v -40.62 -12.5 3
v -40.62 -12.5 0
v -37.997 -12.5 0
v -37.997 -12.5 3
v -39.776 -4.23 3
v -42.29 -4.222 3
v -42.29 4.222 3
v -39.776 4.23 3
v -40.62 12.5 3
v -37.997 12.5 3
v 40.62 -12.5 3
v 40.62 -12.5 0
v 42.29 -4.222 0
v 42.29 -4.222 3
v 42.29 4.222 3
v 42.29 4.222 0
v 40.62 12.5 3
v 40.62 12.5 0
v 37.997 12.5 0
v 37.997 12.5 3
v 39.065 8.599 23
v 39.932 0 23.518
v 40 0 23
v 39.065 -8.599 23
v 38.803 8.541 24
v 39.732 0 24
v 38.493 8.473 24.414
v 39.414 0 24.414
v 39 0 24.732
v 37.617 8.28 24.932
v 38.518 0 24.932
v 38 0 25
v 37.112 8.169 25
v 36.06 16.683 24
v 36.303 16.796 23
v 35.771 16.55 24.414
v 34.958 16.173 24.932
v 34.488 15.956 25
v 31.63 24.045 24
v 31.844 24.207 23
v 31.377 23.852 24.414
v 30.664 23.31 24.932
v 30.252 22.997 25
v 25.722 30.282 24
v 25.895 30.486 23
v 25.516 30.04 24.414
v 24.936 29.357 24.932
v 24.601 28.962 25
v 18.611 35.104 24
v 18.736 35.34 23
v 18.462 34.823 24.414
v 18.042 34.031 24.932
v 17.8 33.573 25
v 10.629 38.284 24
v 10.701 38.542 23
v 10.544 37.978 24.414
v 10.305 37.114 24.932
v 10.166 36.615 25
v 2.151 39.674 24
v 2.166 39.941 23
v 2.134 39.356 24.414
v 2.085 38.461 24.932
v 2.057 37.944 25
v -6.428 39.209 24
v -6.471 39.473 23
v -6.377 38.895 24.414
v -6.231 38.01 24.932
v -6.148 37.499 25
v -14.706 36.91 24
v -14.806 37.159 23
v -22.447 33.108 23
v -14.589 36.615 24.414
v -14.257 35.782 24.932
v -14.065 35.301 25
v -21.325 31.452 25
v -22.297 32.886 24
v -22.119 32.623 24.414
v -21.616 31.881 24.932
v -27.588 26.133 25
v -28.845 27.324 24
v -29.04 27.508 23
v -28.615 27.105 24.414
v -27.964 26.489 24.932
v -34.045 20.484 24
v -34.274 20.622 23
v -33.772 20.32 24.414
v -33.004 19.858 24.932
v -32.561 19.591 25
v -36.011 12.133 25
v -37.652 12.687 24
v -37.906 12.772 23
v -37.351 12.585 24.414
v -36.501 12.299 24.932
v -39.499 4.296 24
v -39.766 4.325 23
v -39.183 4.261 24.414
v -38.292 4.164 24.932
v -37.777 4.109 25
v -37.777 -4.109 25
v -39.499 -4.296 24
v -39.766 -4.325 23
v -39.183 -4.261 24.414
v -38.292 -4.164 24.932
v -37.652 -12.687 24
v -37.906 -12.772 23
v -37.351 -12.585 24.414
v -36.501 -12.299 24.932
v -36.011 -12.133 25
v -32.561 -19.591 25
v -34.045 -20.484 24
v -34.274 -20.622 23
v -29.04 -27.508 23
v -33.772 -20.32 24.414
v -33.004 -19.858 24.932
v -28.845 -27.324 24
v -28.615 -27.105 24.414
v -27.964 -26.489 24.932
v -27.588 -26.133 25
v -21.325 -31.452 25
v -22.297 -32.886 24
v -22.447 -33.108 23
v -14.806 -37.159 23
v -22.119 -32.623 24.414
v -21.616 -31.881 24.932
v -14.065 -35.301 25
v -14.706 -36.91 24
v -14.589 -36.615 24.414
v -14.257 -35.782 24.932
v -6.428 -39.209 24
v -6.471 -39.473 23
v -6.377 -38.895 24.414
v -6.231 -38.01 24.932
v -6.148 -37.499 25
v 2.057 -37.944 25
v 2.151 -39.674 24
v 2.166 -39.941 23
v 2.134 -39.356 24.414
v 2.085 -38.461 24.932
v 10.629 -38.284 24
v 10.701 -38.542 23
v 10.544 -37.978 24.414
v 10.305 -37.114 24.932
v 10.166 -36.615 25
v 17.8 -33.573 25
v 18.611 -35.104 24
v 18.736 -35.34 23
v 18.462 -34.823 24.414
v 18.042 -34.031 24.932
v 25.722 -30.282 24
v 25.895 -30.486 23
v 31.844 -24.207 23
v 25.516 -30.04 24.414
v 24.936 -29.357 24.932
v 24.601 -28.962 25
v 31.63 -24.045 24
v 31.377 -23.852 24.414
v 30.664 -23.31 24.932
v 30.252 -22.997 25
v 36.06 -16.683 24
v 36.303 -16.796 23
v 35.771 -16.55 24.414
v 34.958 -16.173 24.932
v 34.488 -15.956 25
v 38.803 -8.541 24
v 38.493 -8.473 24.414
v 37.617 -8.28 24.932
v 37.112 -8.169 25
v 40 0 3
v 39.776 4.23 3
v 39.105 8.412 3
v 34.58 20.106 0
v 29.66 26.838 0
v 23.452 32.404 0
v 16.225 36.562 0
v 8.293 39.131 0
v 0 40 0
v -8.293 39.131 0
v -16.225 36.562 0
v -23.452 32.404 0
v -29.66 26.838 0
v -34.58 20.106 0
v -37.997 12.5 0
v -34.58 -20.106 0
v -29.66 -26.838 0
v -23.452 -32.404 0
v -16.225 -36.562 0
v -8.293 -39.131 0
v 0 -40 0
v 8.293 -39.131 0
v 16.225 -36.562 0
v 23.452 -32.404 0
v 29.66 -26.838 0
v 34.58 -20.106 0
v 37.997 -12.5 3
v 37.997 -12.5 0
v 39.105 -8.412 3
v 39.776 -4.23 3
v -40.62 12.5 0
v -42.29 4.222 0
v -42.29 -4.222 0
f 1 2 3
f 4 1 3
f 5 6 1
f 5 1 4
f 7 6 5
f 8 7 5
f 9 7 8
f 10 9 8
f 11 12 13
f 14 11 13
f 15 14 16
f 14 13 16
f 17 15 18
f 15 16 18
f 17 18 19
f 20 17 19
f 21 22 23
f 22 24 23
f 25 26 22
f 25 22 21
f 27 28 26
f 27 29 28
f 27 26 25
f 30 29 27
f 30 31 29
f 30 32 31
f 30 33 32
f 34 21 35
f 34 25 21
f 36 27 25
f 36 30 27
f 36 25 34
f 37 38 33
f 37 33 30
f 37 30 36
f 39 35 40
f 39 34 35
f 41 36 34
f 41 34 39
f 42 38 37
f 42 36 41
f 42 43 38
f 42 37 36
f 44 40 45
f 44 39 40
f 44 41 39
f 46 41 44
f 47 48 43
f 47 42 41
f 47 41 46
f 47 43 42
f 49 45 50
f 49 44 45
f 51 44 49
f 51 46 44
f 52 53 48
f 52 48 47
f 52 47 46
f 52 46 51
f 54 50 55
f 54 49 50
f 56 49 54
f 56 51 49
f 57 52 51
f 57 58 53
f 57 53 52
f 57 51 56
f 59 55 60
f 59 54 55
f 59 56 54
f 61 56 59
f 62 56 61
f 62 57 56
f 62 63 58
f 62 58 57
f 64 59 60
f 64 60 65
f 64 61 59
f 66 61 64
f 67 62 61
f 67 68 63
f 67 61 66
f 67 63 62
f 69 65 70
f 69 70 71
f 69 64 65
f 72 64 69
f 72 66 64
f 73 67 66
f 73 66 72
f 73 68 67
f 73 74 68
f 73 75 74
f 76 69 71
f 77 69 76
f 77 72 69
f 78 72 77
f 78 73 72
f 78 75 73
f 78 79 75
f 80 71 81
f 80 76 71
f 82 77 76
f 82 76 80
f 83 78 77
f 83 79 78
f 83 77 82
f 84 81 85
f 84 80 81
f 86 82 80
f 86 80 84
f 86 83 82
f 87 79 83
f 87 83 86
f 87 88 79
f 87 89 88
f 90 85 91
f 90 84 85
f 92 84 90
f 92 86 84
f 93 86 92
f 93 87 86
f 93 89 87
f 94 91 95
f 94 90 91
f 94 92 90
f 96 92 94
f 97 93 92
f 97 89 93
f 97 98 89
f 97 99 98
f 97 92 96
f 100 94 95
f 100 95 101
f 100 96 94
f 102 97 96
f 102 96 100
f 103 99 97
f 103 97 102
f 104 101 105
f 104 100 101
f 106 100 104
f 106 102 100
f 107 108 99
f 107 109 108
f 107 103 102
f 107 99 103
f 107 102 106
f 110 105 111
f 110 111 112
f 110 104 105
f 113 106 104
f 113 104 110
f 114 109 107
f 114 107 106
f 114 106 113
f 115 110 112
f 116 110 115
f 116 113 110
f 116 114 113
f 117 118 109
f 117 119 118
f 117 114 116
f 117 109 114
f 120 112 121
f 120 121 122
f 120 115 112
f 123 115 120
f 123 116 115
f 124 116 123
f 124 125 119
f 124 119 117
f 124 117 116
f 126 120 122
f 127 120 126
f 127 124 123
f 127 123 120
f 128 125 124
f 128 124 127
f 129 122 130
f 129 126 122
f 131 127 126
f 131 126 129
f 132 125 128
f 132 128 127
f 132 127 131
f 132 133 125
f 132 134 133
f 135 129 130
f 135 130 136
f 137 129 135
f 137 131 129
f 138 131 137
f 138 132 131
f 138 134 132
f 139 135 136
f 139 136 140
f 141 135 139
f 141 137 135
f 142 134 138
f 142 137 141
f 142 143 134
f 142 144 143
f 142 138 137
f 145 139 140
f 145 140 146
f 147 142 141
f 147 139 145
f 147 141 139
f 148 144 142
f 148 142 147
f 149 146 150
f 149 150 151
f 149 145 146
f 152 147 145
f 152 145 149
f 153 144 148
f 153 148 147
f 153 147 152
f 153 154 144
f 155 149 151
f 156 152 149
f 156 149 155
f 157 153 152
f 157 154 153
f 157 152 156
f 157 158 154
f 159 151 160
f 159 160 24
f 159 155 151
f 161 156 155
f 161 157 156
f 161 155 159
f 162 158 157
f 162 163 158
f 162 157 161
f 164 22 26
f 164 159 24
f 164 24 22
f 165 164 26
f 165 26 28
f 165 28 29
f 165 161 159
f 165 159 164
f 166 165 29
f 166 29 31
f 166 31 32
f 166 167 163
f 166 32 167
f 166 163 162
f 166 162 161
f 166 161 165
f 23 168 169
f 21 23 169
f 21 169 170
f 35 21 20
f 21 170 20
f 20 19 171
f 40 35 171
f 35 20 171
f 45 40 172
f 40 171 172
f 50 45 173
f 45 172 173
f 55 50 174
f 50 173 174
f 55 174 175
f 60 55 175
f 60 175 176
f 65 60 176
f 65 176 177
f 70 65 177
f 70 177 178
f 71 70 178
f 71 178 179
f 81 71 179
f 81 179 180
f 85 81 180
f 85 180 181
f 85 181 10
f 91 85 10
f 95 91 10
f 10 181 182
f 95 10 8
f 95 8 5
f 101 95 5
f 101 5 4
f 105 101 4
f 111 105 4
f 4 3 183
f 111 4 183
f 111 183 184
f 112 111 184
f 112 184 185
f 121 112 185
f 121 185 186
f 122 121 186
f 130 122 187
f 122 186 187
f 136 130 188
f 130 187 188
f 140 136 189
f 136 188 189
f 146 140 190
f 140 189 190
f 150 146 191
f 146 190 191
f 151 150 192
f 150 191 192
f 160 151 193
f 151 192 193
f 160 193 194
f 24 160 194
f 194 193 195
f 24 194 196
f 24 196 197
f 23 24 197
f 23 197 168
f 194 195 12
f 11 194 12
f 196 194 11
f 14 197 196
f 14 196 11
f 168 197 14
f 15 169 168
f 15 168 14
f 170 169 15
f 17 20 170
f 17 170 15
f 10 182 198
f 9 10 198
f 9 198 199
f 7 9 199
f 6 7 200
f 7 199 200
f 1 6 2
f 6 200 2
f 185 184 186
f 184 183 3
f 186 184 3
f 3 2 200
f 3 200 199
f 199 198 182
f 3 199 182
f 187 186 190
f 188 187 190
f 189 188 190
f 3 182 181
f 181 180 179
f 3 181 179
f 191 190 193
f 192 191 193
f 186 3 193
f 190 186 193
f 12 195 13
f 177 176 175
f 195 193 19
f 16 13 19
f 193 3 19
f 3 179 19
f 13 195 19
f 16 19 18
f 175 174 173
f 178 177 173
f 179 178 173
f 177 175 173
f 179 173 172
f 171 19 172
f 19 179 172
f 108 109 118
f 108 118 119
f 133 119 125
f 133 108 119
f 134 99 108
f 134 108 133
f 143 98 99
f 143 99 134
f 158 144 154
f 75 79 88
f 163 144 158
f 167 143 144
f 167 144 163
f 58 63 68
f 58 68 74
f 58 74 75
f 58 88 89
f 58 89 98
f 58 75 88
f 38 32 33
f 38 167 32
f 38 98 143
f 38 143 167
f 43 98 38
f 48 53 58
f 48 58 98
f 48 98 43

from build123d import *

# Parameters (mm, degrees)
F1_R     = 40
F2_DEPTH = 25
F4_DEPTH = 3
F5_R     = 2


with BuildPart() as f2:
    # F1 (on face) → F2 (new body)
    with BuildSketch(Plane.XY):
        Circle(F1_R)
    extrude(amount=F2_DEPTH)

    # F3 (on face) → F4 (join)
    with BuildSketch(Plane.XY):
        with BuildLine():
            Line((-40.620192, -12.5), (40.620192, -12.5))
            ThreePointArc((40.620192, -12.5), (42.5, 0), (40.620192, 12.5))
            Line((40.620192, 12.5), (-40.620192, 12.5))
            ThreePointArc((-40.620192, 12.5), (-42.5, 0), (-40.620192, -12.5))
        make_face()
    extrude(amount=F4_DEPTH)

    # F5
    f5_edges = [f2.edges().sort_by_distance(p)[0] for p in [
        (-40, 0, 25),
    ]]
    fillet(f5_edges, radius=F5_R)


solid = f2.part
